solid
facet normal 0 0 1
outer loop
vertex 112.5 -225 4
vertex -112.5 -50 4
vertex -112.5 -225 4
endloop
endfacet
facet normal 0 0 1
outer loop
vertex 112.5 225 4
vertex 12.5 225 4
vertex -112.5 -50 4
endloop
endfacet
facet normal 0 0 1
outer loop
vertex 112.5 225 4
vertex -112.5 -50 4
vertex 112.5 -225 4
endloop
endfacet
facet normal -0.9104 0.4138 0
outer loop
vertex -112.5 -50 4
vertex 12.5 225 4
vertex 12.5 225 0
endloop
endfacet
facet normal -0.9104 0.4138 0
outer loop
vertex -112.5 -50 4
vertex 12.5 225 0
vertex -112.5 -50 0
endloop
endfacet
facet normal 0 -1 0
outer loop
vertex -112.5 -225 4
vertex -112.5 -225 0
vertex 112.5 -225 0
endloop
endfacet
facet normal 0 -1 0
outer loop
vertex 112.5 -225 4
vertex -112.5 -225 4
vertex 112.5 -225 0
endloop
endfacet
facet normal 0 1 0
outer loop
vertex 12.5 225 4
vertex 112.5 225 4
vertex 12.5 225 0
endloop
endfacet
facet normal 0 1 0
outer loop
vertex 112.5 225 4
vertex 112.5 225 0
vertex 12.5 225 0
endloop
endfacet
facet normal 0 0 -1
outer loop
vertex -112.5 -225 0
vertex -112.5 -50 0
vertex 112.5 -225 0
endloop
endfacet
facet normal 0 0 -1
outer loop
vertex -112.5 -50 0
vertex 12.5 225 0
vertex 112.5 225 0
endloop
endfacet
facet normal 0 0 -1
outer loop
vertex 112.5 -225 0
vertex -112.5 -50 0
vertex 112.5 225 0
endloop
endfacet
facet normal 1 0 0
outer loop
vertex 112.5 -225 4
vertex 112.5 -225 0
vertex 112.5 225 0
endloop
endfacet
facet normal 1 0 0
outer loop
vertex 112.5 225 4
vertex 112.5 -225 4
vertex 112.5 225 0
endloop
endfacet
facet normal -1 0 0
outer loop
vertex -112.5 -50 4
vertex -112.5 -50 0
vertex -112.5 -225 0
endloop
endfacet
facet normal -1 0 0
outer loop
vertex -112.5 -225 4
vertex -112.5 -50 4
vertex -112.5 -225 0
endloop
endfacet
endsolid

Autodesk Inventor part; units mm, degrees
ref_plane "YZ Plane" through (0, 0, 0) normal (1, 0, 0) x (0, 1, 0)
ref_plane "XZ Plane" through (0, 0, 0) normal (0, 1, 0) x (-1, 0, 0)
ref_plane "XY Plane" through (0, 0, 0) normal (0, 0, 1) x (1, 0, 0)
sketch "Sketch1" plane through (0, 0, 0) normal (0, 0, 1) x (1, 0, 0)
  line L0 (-112.5, -225) -> (112.5, -225)
  line L1 (112.5, -225) -> (112.5, 225)
  line L2 (112.5, 225) -> (-112.5, 225)
  line L3 (-112.5, 225) -> (-112.5, -225)
  line L4 (-112.5, -225) -> (112.5, 225) construction
  line L5 (112.5, -225) -> (-112.5, 225) construction
  point P0 (0, 0)
  dimension "d0" = 225
  dimension "d1" = 450
extrude "Extrusion1" add sketch "Sketch1" along normal blind 4
sketch "Sketch2" plane through (0, 0, 4) normal (0, 0, 1) x (1, 0, 0)
  line L0 (-112.5, 225) -> (12.5, 225)
  line L1 (12.5, 225) -> (-112.5, -50)
  line L2 (-112.5, 225) -> (-112.5, -50)
  line L3 (112.5, -225) -> (112.5, 225) projected
  line L4 (112.5, -50) -> (112.5, 225)
  line L5 (112.5, 225) -> (62.5, 225)
  line L6 (-112.5, -225) -> (112.5, -225) projected
  line L7 (-112.5, -50) -> (-112.5, 225)
  line L8 (-112.5, 225) -> (12.5, 225)
  point P0 (0, 0)
  dimension "d8" = 175
extrude "Extrusion2" cut sketch "Sketch2" against normal blind 4
properties part number "SidePanel"
